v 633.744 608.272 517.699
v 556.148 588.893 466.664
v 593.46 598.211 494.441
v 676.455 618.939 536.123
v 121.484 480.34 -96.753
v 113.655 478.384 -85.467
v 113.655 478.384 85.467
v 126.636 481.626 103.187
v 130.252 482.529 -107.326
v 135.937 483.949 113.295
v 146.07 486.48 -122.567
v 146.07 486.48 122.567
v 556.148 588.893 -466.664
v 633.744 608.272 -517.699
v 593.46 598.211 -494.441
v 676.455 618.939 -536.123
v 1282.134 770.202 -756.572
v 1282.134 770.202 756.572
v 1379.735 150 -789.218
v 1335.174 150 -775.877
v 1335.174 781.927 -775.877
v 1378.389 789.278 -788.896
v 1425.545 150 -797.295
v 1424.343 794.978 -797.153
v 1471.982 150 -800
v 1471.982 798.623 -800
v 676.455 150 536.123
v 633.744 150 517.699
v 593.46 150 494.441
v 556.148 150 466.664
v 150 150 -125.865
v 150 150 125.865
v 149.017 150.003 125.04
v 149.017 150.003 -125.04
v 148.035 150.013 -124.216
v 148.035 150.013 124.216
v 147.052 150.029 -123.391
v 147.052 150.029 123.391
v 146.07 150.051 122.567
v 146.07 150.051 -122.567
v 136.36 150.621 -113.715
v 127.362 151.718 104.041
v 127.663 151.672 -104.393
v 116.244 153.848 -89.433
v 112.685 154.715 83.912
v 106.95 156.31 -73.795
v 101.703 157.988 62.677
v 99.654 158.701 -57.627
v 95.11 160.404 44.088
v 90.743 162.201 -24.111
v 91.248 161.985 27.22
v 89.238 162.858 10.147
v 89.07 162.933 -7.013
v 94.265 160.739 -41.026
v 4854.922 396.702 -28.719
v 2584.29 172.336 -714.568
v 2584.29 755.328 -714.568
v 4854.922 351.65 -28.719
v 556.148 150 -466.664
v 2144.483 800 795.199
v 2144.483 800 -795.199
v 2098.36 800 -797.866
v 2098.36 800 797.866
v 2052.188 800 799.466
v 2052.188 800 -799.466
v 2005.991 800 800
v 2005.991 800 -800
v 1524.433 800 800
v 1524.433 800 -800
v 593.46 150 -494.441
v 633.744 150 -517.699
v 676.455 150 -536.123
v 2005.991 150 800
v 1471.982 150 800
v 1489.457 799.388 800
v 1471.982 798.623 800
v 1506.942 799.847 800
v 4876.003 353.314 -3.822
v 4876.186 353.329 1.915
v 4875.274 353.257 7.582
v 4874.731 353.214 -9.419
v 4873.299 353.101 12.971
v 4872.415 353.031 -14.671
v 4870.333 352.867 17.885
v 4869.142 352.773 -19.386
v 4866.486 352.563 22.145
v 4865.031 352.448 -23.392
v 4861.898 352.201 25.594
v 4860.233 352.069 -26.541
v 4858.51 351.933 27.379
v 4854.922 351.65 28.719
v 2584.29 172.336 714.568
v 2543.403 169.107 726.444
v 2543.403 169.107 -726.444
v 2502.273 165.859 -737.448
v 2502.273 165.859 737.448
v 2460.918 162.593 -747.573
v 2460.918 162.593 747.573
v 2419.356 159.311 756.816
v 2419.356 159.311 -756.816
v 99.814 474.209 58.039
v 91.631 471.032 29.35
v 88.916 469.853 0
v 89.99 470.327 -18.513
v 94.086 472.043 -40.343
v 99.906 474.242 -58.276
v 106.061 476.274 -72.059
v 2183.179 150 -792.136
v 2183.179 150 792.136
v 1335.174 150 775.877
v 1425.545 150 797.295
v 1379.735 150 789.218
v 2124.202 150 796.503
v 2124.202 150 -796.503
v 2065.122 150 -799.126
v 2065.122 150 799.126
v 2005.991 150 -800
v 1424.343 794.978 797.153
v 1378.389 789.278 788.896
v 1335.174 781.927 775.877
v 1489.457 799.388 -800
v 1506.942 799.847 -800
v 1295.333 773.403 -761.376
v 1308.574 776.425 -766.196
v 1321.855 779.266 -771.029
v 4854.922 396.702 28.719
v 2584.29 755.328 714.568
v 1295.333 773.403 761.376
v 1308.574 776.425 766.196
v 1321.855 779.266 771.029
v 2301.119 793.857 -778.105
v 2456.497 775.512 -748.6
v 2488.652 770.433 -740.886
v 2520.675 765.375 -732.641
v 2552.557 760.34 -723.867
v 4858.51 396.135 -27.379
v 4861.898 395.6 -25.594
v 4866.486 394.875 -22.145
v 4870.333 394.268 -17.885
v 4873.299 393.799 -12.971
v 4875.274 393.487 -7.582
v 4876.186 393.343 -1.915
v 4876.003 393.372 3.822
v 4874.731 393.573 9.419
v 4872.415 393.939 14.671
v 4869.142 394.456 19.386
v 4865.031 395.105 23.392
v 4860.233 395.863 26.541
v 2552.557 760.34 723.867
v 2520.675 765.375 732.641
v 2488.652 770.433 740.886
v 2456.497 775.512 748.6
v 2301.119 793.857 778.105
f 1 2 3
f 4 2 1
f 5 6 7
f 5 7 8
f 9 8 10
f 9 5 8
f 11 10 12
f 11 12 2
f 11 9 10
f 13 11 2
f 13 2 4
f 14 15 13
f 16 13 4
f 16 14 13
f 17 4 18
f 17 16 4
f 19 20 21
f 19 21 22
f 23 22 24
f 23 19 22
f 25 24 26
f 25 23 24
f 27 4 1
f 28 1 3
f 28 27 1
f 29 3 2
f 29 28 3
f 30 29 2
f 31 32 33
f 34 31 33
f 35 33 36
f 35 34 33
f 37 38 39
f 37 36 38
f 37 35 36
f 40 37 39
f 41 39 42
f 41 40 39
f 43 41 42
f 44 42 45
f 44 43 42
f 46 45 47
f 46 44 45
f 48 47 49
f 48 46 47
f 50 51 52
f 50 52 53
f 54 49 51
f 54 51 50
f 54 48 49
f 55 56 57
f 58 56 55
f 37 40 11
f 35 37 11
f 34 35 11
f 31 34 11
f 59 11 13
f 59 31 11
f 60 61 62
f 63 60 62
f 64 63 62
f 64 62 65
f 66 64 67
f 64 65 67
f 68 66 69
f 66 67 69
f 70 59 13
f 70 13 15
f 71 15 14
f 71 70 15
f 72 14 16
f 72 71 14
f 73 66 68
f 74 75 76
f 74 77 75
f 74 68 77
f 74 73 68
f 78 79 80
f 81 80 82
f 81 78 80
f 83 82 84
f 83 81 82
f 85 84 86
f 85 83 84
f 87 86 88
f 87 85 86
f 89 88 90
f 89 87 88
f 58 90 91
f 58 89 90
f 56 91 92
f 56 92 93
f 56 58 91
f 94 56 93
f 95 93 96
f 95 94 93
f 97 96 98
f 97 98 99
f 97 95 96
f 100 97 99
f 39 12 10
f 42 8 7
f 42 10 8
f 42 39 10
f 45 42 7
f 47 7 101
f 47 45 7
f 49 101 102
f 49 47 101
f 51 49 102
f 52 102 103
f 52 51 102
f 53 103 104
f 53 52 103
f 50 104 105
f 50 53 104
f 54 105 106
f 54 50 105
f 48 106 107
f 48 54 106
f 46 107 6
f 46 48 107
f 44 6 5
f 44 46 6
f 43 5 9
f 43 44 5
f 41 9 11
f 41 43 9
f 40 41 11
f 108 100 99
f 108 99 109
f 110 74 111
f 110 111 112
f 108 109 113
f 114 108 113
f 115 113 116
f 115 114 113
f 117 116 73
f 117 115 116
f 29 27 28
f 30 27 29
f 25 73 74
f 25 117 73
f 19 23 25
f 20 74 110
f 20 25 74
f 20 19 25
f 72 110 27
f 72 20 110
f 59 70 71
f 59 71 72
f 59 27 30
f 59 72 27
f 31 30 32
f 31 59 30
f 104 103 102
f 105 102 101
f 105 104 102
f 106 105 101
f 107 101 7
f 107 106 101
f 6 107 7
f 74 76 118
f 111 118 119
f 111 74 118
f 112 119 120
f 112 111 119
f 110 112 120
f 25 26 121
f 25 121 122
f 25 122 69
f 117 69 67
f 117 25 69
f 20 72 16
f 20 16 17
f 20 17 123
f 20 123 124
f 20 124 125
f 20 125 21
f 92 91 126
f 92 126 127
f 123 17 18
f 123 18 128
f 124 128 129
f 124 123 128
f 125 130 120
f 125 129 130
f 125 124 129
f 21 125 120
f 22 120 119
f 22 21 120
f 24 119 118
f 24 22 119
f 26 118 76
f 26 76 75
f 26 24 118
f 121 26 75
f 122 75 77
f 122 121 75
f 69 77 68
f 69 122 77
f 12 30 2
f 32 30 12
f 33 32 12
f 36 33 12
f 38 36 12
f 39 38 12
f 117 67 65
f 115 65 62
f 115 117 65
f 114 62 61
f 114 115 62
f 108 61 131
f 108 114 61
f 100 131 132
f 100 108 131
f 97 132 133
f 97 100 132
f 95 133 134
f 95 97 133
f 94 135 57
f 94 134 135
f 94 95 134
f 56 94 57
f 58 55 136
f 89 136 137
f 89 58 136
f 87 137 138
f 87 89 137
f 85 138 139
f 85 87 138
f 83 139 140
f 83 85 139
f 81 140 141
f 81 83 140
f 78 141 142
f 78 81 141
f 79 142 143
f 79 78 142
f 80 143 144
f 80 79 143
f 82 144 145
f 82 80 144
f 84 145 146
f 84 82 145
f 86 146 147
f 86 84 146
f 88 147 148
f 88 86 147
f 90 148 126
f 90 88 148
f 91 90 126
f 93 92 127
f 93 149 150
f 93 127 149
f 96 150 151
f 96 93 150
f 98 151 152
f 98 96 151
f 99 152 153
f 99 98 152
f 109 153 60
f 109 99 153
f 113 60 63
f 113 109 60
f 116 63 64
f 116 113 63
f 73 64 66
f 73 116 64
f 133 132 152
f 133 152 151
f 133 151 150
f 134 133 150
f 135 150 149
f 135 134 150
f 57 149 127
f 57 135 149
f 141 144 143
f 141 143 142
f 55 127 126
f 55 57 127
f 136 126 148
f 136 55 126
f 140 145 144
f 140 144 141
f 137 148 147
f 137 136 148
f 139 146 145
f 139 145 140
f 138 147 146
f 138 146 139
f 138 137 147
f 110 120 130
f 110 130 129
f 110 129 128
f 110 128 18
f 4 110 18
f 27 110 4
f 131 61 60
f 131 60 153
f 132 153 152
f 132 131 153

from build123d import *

# Parameters (mm, degrees)
TOPVIEW_EXTRUDE_DEPTH      = 800
SIDEPROFILE_CUT_DEPTH      = 5006.775642449
SIDEPROFILE_CUT_DEPTH_BACK = 5006.775642449
SKETCH2_OUTSIDE_W          = 5811.458
SKETCH2_OUTSIDE_H          = 1824.126


with BuildPart() as part:
    # Sketch1 → TopView_Extrude (new body)
    with BuildSketch(Plane(origin=(0, 0, 0), x_dir=(1, 0, 0), z_dir=(0, 1, 0))):
        with BuildLine():
            Line((146.069849076, 122.567124227), (556.148324977, 466.663731547))
            ThreePointArc((556.148324977, 466.663731547), (613.263316637, 506.656075273), (676.455195963, 536.122941687))
            Line((676.455195963, 536.122941687), (1335.173700718, 775.877020708))
            ThreePointArc((1335.173700718, 775.877020708), (1402.522523085, 793.923094197), (1471.981833896, 800))
            Line((1471.981833896, 800), (2005.990858989, 800))
            ThreePointArc((2005.990858989, 800), (2298.278743763, 778.526672151), (2584.290234961, 714.567792414))
            Line((2584.290234961, 714.567792414), (4854.922001024, 28.718516886))
            ThreePointArc((4854.922001024, 28.718516886), (4876.247510385, 0), (4854.922001024, -28.718516886))
            Line((4854.922001024, -28.718516886), (2584.290234961, -714.567792414))
            ThreePointArc((2584.290234961, -714.567792414), (2298.278743763, -778.526672151), (2005.990858989, -800))
            Line((2005.990858989, -800), (1471.981833896, -800))
            ThreePointArc((1471.981833896, -800), (1402.522523085, -793.923094197), (1335.173700718, -775.877020708))
            Line((1335.173700718, -775.877020708), (676.455195963, -536.122941687))
            ThreePointArc((676.455195963, -536.122941687), (613.263316637, -506.656075273), (556.148324977, -466.663731547))
            Line((556.148324977, -466.663731547), (146.069849076, -122.567124227))
            ThreePointArc((146.069849076, -122.567124227), (88.915850742, 0), (146.069849076, 122.567124227))
        make_face()
    extrude(amount=TOPVIEW_EXTRUDE_DEPTH)

    # Sketch2 outside → SideProfile_Cut (cut, two sides: drawn at the far end of the back side and taken through both)
    with BuildSketch(Plane.XY.offset(-SIDEPROFILE_CUT_DEPTH_BACK)):
        with Locations((2482.582, 400)):
            Rectangle(SKETCH2_OUTSIDE_W, SKETCH2_OUTSIDE_H)
        with BuildLine():
            Line((0, 300), (0, 332.854125267))
            ThreePointArc((0, 332.854125267), (31.780430043, 425.180358155), (113.65511039, 478.384359237))
            Line((113.65511039, 478.384359237), (1282.133703367, 770.201559797))
            ThreePointArc((1282.133703367, 770.201559797), (1402.370605908, 792.522432945), (1524.432967436, 800))
            Line((1524.432967436, 800), (2144.482683126, 800))
            ThreePointArc((2144.482683126, 800), (2300.969778196, 793.868548595), (2456.497380248, 775.511789076))
            Line((2456.497380248, 775.511789076), (4950, 381.685))
            Line((4950, 381.685), (4950, 359.158))
            Line((4950, 359.158), (2419.355991101, 159.311049986))
            ThreePointArc((2419.355991101, 159.311049986), (2301.359194606, 152.328666278), (2183.178929847, 150))
            Line((2183.178929847, 150), (150, 150))
            ThreePointArc((150, 150), (43.933982822, 193.933982822), (0, 300))
        make_face(mode=Mode.SUBTRACT)
    extrude(amount=SIDEPROFILE_CUT_DEPTH + SIDEPROFILE_CUT_DEPTH_BACK, mode=Mode.SUBTRACT)


solid = part.part
